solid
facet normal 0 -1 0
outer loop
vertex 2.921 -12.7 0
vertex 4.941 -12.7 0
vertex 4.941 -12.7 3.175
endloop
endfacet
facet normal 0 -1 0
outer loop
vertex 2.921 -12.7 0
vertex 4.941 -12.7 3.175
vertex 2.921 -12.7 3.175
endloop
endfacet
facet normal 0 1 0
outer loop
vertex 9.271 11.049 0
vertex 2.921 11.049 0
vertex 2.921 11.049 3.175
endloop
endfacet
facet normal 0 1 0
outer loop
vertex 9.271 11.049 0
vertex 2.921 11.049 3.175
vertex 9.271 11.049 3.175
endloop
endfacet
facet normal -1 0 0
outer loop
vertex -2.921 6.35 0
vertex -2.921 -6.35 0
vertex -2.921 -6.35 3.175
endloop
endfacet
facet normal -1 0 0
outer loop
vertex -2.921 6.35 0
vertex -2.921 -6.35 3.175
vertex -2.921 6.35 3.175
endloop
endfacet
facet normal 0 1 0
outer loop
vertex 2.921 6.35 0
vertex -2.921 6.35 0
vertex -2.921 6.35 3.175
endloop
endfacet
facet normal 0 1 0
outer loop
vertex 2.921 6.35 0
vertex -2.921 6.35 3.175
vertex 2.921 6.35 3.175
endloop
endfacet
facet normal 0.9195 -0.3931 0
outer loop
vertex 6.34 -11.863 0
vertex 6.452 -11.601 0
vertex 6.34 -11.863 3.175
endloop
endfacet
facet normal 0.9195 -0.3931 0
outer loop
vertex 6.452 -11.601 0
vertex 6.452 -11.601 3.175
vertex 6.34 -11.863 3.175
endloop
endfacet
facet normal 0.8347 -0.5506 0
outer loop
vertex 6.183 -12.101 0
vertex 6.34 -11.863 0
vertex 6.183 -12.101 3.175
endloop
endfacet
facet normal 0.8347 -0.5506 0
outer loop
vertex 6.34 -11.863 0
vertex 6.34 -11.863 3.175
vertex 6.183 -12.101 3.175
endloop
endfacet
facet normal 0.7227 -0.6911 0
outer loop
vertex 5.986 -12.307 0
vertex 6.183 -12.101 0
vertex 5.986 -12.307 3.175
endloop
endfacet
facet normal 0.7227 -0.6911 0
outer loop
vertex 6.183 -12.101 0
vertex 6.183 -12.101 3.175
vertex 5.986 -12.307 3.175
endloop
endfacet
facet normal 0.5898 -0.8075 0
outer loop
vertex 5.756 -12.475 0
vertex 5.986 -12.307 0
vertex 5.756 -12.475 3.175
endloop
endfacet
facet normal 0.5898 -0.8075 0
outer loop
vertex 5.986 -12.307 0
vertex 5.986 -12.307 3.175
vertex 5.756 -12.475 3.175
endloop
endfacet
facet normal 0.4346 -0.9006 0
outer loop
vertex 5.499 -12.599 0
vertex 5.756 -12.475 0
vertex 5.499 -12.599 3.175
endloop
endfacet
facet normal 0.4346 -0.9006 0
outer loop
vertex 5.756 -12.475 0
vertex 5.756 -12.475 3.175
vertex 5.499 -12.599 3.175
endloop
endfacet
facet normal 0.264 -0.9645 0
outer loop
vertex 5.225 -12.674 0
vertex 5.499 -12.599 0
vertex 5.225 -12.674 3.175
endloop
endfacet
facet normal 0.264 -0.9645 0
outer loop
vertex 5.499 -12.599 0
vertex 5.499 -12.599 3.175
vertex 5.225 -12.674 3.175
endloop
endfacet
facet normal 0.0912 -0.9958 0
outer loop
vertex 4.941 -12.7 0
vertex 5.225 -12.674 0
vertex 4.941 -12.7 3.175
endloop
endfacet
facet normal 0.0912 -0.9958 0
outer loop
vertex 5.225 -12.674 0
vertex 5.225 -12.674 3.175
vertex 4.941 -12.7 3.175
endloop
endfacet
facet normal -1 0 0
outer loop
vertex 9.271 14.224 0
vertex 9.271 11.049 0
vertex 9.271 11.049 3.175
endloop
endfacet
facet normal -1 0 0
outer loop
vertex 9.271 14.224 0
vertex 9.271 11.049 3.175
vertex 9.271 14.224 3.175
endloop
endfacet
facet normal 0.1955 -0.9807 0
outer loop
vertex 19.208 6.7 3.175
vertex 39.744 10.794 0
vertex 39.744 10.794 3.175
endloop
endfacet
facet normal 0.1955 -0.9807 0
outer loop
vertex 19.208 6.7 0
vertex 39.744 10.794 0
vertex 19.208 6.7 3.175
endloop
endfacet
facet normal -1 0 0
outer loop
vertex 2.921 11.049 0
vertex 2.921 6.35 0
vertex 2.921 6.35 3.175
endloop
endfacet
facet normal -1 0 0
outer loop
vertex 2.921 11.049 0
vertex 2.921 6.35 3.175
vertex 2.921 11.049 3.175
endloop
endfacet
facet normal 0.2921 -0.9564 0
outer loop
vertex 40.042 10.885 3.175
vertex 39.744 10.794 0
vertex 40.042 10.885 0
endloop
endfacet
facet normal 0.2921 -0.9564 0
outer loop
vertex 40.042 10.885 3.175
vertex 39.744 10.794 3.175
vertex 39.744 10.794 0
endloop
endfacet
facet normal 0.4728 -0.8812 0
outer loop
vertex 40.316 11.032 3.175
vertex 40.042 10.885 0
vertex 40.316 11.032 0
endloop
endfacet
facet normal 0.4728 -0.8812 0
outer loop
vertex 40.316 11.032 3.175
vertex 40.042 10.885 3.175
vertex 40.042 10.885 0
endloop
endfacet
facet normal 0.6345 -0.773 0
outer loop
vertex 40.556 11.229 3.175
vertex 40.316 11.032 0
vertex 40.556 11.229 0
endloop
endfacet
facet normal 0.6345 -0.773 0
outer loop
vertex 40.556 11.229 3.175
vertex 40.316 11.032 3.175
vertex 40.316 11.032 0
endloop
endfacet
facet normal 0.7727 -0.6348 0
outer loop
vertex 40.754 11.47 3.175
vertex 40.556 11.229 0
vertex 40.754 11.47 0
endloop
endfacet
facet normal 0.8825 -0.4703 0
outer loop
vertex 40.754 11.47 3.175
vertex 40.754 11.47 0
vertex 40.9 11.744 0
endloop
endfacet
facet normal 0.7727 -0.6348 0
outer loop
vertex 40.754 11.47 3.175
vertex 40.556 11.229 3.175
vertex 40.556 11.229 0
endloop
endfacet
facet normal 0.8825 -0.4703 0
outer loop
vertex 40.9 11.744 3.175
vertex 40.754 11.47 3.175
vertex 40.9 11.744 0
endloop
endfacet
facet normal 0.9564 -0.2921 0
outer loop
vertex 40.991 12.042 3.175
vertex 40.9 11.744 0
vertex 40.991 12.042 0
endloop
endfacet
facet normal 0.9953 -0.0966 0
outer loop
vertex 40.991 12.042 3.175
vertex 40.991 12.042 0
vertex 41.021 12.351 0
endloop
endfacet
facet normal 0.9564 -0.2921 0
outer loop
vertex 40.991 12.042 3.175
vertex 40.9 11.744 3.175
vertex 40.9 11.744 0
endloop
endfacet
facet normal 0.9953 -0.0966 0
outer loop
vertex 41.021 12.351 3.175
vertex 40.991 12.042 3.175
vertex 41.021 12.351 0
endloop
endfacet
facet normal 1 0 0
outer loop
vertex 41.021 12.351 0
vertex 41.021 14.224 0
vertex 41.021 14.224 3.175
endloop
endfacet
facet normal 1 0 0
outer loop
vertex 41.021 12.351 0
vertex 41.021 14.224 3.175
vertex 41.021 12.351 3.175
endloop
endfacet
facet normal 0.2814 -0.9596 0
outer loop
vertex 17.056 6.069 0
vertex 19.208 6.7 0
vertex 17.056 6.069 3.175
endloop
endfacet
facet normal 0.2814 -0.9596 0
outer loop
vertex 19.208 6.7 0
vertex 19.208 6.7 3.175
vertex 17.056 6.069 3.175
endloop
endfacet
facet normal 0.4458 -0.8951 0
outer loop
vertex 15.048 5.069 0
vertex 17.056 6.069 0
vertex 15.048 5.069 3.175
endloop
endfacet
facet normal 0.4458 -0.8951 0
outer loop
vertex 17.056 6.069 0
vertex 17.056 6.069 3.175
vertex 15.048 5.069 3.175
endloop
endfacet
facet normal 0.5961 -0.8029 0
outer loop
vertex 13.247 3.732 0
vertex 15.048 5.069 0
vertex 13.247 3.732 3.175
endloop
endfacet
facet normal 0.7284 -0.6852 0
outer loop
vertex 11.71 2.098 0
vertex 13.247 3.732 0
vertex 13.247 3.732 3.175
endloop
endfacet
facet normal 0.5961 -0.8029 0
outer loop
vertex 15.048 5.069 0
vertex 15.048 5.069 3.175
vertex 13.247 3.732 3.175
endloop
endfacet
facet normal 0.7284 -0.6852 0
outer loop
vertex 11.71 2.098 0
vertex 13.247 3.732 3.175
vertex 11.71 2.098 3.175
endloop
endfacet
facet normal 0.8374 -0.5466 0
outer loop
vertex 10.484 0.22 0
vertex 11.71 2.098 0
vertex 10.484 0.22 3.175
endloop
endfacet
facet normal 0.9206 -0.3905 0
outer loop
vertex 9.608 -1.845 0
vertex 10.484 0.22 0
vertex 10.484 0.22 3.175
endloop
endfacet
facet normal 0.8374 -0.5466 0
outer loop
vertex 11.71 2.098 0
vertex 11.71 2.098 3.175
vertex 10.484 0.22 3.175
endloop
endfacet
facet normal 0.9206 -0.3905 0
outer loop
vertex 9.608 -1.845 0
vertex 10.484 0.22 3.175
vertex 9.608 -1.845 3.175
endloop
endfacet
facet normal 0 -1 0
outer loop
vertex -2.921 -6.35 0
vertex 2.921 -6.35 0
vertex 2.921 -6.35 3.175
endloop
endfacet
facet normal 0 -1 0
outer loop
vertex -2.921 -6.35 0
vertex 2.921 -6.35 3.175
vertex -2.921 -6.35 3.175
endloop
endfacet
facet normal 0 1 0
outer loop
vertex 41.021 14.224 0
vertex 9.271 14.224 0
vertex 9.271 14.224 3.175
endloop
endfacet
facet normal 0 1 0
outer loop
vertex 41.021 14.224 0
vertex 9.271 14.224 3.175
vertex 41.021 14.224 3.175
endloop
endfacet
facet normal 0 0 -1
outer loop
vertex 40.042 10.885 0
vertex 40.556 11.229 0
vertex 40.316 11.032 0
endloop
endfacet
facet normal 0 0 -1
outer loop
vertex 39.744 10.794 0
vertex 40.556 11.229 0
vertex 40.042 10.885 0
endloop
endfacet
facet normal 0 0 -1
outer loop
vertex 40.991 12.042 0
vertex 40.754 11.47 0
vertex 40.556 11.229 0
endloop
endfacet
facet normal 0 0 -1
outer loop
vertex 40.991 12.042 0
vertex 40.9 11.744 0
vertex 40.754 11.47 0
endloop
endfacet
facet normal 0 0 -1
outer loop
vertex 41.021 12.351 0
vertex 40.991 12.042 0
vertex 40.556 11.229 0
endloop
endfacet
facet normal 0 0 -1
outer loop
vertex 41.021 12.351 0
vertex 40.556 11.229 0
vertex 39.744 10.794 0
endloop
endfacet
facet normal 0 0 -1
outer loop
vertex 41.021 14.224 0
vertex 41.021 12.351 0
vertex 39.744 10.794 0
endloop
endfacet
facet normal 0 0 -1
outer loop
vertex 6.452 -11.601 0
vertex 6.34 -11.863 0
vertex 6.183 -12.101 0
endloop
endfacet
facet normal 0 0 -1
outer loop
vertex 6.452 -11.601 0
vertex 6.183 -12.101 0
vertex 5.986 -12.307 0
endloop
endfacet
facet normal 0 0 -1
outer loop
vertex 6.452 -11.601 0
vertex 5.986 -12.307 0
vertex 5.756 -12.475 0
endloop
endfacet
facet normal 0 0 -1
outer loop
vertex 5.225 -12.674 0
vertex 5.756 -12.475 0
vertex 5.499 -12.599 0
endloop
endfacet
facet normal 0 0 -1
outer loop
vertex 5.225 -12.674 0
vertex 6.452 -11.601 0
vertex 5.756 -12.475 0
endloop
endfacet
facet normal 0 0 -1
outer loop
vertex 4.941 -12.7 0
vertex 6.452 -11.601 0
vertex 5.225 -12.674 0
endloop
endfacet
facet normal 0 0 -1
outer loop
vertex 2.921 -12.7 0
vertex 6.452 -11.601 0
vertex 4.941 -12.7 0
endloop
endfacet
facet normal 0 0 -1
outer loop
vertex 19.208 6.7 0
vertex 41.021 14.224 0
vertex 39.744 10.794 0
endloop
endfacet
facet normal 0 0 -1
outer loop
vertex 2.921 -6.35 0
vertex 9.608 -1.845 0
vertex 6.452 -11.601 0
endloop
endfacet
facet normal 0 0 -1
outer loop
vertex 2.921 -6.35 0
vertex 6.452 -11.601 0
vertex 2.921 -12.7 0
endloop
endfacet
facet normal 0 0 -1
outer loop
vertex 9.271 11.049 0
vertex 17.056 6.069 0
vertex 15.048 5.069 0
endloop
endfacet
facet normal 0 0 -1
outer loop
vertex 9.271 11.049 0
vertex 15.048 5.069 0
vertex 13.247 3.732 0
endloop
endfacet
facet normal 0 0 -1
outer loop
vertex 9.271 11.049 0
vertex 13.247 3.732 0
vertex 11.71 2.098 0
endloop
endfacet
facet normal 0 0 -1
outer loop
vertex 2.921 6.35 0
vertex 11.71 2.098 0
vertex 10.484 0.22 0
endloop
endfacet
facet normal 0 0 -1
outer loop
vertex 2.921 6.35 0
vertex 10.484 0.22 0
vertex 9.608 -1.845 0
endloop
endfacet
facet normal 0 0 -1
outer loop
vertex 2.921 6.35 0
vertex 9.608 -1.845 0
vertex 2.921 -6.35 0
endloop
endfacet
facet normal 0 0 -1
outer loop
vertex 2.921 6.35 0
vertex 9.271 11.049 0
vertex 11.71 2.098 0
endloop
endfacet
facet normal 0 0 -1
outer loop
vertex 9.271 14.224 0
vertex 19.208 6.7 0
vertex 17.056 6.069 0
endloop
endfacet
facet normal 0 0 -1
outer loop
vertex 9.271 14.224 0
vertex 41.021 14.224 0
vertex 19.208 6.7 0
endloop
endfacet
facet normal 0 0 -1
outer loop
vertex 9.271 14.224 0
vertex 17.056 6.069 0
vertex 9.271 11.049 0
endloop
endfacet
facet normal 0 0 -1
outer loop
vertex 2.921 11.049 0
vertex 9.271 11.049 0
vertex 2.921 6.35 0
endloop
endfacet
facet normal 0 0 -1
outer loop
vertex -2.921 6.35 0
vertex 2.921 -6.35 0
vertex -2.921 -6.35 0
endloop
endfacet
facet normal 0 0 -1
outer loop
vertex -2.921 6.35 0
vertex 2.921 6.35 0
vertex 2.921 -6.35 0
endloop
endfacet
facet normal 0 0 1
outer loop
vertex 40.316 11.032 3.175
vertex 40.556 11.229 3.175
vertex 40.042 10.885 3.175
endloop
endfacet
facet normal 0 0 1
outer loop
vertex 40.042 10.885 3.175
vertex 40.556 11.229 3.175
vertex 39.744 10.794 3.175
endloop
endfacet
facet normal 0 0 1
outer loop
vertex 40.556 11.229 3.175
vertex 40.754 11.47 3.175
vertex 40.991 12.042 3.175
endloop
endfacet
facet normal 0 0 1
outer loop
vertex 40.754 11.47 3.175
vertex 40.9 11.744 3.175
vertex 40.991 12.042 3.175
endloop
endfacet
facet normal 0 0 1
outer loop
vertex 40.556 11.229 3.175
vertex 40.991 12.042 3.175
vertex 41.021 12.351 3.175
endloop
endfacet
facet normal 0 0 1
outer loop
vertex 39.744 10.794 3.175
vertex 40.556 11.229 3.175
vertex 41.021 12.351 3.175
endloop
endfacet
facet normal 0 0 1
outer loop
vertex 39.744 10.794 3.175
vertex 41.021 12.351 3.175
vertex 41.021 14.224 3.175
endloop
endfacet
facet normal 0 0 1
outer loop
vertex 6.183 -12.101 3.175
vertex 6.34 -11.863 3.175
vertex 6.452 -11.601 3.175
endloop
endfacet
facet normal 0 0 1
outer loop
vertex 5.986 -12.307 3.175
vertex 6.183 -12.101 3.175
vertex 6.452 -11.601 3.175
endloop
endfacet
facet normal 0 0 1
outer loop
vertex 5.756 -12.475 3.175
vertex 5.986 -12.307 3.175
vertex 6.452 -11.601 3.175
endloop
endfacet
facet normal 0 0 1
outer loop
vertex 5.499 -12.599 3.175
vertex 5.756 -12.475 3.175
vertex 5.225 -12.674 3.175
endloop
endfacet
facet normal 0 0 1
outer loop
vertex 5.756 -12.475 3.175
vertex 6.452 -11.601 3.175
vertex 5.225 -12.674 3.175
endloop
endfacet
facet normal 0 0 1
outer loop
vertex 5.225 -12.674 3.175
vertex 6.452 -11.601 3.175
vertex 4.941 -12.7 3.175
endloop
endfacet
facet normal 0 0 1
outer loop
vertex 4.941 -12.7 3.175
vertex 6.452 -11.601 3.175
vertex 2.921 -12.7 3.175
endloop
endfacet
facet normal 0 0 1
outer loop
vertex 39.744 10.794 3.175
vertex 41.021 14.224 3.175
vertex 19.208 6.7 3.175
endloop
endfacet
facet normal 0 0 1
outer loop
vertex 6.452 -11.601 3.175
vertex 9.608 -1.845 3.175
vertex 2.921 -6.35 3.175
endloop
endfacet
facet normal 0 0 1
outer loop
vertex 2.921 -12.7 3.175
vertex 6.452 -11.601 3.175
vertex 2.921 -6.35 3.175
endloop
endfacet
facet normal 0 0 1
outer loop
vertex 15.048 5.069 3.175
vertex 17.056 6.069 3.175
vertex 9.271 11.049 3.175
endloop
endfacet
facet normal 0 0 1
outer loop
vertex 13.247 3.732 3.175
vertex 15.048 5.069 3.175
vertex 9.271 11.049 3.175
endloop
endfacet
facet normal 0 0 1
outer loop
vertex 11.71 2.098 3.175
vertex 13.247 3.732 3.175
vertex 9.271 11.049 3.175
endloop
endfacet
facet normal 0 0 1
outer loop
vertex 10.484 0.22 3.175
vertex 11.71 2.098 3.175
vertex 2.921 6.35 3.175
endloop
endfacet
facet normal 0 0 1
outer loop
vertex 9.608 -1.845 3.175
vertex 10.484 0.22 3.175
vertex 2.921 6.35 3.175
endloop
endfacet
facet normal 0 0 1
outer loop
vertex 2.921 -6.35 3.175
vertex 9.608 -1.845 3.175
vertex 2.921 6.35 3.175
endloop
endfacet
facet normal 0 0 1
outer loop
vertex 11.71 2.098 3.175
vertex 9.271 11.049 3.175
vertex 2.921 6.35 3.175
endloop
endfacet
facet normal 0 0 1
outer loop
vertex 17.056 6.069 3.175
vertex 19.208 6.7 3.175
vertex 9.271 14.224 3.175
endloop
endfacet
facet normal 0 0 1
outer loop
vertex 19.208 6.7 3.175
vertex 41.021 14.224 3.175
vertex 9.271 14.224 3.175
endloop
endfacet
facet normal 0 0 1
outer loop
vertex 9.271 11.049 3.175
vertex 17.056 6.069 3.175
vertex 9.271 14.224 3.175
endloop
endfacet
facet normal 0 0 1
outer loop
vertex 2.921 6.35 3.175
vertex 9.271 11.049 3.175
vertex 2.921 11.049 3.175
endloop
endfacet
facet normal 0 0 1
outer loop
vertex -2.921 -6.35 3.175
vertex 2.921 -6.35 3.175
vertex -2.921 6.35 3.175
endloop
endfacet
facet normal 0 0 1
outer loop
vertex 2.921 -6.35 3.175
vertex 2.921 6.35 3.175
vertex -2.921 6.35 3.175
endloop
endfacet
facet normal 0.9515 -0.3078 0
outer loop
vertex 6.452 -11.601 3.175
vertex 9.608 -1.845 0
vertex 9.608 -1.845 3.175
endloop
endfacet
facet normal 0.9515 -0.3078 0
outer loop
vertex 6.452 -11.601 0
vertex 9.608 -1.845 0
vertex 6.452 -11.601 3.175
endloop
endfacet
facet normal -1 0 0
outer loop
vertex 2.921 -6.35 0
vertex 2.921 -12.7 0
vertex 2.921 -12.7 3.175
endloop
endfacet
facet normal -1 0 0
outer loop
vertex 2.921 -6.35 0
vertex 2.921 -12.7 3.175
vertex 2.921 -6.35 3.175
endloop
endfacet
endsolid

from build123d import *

# Parameters (mm, degrees)
BOSS_EXTRUDE1_DEPTH = 3.175
FILLET1_R           = 12.7
FILLET2_R           = 1.5875


with BuildPart() as part:
    # Sketch1 → Boss-Extrude1 (new body)
    with BuildSketch(Plane.XY):
        Polygon((2.921, 6.35), (2.921, 11.049), (9.271, 11.049), (9.271, 14.224), (41.021, 14.224), (41.021, 11.049), (11.901256121, 5.243743879), (6.096, -12.7), (2.921, -12.7), (2.921, -6.35), (-2.921, -6.35), (-2.921, 6.35), align=None)
    extrude(amount=BOSS_EXTRUDE1_DEPTH)

    # Fillet1
    fillet1_edges = [part.edges().sort_by_distance(p)[0] for p in [
        (11.901256121, 5.243743879, 1.5875),
    ]]
    fillet(fillet1_edges, radius=FILLET1_R)

    # Fillet2
    fillet2_edges = [part.edges().sort_by_distance(p)[0] for p in [
        (41.021, 11.049, 1.5875),
        (6.096, -12.7, 1.5875),
    ]]
    fillet(fillet2_edges, radius=FILLET2_R)


solid = part.part
